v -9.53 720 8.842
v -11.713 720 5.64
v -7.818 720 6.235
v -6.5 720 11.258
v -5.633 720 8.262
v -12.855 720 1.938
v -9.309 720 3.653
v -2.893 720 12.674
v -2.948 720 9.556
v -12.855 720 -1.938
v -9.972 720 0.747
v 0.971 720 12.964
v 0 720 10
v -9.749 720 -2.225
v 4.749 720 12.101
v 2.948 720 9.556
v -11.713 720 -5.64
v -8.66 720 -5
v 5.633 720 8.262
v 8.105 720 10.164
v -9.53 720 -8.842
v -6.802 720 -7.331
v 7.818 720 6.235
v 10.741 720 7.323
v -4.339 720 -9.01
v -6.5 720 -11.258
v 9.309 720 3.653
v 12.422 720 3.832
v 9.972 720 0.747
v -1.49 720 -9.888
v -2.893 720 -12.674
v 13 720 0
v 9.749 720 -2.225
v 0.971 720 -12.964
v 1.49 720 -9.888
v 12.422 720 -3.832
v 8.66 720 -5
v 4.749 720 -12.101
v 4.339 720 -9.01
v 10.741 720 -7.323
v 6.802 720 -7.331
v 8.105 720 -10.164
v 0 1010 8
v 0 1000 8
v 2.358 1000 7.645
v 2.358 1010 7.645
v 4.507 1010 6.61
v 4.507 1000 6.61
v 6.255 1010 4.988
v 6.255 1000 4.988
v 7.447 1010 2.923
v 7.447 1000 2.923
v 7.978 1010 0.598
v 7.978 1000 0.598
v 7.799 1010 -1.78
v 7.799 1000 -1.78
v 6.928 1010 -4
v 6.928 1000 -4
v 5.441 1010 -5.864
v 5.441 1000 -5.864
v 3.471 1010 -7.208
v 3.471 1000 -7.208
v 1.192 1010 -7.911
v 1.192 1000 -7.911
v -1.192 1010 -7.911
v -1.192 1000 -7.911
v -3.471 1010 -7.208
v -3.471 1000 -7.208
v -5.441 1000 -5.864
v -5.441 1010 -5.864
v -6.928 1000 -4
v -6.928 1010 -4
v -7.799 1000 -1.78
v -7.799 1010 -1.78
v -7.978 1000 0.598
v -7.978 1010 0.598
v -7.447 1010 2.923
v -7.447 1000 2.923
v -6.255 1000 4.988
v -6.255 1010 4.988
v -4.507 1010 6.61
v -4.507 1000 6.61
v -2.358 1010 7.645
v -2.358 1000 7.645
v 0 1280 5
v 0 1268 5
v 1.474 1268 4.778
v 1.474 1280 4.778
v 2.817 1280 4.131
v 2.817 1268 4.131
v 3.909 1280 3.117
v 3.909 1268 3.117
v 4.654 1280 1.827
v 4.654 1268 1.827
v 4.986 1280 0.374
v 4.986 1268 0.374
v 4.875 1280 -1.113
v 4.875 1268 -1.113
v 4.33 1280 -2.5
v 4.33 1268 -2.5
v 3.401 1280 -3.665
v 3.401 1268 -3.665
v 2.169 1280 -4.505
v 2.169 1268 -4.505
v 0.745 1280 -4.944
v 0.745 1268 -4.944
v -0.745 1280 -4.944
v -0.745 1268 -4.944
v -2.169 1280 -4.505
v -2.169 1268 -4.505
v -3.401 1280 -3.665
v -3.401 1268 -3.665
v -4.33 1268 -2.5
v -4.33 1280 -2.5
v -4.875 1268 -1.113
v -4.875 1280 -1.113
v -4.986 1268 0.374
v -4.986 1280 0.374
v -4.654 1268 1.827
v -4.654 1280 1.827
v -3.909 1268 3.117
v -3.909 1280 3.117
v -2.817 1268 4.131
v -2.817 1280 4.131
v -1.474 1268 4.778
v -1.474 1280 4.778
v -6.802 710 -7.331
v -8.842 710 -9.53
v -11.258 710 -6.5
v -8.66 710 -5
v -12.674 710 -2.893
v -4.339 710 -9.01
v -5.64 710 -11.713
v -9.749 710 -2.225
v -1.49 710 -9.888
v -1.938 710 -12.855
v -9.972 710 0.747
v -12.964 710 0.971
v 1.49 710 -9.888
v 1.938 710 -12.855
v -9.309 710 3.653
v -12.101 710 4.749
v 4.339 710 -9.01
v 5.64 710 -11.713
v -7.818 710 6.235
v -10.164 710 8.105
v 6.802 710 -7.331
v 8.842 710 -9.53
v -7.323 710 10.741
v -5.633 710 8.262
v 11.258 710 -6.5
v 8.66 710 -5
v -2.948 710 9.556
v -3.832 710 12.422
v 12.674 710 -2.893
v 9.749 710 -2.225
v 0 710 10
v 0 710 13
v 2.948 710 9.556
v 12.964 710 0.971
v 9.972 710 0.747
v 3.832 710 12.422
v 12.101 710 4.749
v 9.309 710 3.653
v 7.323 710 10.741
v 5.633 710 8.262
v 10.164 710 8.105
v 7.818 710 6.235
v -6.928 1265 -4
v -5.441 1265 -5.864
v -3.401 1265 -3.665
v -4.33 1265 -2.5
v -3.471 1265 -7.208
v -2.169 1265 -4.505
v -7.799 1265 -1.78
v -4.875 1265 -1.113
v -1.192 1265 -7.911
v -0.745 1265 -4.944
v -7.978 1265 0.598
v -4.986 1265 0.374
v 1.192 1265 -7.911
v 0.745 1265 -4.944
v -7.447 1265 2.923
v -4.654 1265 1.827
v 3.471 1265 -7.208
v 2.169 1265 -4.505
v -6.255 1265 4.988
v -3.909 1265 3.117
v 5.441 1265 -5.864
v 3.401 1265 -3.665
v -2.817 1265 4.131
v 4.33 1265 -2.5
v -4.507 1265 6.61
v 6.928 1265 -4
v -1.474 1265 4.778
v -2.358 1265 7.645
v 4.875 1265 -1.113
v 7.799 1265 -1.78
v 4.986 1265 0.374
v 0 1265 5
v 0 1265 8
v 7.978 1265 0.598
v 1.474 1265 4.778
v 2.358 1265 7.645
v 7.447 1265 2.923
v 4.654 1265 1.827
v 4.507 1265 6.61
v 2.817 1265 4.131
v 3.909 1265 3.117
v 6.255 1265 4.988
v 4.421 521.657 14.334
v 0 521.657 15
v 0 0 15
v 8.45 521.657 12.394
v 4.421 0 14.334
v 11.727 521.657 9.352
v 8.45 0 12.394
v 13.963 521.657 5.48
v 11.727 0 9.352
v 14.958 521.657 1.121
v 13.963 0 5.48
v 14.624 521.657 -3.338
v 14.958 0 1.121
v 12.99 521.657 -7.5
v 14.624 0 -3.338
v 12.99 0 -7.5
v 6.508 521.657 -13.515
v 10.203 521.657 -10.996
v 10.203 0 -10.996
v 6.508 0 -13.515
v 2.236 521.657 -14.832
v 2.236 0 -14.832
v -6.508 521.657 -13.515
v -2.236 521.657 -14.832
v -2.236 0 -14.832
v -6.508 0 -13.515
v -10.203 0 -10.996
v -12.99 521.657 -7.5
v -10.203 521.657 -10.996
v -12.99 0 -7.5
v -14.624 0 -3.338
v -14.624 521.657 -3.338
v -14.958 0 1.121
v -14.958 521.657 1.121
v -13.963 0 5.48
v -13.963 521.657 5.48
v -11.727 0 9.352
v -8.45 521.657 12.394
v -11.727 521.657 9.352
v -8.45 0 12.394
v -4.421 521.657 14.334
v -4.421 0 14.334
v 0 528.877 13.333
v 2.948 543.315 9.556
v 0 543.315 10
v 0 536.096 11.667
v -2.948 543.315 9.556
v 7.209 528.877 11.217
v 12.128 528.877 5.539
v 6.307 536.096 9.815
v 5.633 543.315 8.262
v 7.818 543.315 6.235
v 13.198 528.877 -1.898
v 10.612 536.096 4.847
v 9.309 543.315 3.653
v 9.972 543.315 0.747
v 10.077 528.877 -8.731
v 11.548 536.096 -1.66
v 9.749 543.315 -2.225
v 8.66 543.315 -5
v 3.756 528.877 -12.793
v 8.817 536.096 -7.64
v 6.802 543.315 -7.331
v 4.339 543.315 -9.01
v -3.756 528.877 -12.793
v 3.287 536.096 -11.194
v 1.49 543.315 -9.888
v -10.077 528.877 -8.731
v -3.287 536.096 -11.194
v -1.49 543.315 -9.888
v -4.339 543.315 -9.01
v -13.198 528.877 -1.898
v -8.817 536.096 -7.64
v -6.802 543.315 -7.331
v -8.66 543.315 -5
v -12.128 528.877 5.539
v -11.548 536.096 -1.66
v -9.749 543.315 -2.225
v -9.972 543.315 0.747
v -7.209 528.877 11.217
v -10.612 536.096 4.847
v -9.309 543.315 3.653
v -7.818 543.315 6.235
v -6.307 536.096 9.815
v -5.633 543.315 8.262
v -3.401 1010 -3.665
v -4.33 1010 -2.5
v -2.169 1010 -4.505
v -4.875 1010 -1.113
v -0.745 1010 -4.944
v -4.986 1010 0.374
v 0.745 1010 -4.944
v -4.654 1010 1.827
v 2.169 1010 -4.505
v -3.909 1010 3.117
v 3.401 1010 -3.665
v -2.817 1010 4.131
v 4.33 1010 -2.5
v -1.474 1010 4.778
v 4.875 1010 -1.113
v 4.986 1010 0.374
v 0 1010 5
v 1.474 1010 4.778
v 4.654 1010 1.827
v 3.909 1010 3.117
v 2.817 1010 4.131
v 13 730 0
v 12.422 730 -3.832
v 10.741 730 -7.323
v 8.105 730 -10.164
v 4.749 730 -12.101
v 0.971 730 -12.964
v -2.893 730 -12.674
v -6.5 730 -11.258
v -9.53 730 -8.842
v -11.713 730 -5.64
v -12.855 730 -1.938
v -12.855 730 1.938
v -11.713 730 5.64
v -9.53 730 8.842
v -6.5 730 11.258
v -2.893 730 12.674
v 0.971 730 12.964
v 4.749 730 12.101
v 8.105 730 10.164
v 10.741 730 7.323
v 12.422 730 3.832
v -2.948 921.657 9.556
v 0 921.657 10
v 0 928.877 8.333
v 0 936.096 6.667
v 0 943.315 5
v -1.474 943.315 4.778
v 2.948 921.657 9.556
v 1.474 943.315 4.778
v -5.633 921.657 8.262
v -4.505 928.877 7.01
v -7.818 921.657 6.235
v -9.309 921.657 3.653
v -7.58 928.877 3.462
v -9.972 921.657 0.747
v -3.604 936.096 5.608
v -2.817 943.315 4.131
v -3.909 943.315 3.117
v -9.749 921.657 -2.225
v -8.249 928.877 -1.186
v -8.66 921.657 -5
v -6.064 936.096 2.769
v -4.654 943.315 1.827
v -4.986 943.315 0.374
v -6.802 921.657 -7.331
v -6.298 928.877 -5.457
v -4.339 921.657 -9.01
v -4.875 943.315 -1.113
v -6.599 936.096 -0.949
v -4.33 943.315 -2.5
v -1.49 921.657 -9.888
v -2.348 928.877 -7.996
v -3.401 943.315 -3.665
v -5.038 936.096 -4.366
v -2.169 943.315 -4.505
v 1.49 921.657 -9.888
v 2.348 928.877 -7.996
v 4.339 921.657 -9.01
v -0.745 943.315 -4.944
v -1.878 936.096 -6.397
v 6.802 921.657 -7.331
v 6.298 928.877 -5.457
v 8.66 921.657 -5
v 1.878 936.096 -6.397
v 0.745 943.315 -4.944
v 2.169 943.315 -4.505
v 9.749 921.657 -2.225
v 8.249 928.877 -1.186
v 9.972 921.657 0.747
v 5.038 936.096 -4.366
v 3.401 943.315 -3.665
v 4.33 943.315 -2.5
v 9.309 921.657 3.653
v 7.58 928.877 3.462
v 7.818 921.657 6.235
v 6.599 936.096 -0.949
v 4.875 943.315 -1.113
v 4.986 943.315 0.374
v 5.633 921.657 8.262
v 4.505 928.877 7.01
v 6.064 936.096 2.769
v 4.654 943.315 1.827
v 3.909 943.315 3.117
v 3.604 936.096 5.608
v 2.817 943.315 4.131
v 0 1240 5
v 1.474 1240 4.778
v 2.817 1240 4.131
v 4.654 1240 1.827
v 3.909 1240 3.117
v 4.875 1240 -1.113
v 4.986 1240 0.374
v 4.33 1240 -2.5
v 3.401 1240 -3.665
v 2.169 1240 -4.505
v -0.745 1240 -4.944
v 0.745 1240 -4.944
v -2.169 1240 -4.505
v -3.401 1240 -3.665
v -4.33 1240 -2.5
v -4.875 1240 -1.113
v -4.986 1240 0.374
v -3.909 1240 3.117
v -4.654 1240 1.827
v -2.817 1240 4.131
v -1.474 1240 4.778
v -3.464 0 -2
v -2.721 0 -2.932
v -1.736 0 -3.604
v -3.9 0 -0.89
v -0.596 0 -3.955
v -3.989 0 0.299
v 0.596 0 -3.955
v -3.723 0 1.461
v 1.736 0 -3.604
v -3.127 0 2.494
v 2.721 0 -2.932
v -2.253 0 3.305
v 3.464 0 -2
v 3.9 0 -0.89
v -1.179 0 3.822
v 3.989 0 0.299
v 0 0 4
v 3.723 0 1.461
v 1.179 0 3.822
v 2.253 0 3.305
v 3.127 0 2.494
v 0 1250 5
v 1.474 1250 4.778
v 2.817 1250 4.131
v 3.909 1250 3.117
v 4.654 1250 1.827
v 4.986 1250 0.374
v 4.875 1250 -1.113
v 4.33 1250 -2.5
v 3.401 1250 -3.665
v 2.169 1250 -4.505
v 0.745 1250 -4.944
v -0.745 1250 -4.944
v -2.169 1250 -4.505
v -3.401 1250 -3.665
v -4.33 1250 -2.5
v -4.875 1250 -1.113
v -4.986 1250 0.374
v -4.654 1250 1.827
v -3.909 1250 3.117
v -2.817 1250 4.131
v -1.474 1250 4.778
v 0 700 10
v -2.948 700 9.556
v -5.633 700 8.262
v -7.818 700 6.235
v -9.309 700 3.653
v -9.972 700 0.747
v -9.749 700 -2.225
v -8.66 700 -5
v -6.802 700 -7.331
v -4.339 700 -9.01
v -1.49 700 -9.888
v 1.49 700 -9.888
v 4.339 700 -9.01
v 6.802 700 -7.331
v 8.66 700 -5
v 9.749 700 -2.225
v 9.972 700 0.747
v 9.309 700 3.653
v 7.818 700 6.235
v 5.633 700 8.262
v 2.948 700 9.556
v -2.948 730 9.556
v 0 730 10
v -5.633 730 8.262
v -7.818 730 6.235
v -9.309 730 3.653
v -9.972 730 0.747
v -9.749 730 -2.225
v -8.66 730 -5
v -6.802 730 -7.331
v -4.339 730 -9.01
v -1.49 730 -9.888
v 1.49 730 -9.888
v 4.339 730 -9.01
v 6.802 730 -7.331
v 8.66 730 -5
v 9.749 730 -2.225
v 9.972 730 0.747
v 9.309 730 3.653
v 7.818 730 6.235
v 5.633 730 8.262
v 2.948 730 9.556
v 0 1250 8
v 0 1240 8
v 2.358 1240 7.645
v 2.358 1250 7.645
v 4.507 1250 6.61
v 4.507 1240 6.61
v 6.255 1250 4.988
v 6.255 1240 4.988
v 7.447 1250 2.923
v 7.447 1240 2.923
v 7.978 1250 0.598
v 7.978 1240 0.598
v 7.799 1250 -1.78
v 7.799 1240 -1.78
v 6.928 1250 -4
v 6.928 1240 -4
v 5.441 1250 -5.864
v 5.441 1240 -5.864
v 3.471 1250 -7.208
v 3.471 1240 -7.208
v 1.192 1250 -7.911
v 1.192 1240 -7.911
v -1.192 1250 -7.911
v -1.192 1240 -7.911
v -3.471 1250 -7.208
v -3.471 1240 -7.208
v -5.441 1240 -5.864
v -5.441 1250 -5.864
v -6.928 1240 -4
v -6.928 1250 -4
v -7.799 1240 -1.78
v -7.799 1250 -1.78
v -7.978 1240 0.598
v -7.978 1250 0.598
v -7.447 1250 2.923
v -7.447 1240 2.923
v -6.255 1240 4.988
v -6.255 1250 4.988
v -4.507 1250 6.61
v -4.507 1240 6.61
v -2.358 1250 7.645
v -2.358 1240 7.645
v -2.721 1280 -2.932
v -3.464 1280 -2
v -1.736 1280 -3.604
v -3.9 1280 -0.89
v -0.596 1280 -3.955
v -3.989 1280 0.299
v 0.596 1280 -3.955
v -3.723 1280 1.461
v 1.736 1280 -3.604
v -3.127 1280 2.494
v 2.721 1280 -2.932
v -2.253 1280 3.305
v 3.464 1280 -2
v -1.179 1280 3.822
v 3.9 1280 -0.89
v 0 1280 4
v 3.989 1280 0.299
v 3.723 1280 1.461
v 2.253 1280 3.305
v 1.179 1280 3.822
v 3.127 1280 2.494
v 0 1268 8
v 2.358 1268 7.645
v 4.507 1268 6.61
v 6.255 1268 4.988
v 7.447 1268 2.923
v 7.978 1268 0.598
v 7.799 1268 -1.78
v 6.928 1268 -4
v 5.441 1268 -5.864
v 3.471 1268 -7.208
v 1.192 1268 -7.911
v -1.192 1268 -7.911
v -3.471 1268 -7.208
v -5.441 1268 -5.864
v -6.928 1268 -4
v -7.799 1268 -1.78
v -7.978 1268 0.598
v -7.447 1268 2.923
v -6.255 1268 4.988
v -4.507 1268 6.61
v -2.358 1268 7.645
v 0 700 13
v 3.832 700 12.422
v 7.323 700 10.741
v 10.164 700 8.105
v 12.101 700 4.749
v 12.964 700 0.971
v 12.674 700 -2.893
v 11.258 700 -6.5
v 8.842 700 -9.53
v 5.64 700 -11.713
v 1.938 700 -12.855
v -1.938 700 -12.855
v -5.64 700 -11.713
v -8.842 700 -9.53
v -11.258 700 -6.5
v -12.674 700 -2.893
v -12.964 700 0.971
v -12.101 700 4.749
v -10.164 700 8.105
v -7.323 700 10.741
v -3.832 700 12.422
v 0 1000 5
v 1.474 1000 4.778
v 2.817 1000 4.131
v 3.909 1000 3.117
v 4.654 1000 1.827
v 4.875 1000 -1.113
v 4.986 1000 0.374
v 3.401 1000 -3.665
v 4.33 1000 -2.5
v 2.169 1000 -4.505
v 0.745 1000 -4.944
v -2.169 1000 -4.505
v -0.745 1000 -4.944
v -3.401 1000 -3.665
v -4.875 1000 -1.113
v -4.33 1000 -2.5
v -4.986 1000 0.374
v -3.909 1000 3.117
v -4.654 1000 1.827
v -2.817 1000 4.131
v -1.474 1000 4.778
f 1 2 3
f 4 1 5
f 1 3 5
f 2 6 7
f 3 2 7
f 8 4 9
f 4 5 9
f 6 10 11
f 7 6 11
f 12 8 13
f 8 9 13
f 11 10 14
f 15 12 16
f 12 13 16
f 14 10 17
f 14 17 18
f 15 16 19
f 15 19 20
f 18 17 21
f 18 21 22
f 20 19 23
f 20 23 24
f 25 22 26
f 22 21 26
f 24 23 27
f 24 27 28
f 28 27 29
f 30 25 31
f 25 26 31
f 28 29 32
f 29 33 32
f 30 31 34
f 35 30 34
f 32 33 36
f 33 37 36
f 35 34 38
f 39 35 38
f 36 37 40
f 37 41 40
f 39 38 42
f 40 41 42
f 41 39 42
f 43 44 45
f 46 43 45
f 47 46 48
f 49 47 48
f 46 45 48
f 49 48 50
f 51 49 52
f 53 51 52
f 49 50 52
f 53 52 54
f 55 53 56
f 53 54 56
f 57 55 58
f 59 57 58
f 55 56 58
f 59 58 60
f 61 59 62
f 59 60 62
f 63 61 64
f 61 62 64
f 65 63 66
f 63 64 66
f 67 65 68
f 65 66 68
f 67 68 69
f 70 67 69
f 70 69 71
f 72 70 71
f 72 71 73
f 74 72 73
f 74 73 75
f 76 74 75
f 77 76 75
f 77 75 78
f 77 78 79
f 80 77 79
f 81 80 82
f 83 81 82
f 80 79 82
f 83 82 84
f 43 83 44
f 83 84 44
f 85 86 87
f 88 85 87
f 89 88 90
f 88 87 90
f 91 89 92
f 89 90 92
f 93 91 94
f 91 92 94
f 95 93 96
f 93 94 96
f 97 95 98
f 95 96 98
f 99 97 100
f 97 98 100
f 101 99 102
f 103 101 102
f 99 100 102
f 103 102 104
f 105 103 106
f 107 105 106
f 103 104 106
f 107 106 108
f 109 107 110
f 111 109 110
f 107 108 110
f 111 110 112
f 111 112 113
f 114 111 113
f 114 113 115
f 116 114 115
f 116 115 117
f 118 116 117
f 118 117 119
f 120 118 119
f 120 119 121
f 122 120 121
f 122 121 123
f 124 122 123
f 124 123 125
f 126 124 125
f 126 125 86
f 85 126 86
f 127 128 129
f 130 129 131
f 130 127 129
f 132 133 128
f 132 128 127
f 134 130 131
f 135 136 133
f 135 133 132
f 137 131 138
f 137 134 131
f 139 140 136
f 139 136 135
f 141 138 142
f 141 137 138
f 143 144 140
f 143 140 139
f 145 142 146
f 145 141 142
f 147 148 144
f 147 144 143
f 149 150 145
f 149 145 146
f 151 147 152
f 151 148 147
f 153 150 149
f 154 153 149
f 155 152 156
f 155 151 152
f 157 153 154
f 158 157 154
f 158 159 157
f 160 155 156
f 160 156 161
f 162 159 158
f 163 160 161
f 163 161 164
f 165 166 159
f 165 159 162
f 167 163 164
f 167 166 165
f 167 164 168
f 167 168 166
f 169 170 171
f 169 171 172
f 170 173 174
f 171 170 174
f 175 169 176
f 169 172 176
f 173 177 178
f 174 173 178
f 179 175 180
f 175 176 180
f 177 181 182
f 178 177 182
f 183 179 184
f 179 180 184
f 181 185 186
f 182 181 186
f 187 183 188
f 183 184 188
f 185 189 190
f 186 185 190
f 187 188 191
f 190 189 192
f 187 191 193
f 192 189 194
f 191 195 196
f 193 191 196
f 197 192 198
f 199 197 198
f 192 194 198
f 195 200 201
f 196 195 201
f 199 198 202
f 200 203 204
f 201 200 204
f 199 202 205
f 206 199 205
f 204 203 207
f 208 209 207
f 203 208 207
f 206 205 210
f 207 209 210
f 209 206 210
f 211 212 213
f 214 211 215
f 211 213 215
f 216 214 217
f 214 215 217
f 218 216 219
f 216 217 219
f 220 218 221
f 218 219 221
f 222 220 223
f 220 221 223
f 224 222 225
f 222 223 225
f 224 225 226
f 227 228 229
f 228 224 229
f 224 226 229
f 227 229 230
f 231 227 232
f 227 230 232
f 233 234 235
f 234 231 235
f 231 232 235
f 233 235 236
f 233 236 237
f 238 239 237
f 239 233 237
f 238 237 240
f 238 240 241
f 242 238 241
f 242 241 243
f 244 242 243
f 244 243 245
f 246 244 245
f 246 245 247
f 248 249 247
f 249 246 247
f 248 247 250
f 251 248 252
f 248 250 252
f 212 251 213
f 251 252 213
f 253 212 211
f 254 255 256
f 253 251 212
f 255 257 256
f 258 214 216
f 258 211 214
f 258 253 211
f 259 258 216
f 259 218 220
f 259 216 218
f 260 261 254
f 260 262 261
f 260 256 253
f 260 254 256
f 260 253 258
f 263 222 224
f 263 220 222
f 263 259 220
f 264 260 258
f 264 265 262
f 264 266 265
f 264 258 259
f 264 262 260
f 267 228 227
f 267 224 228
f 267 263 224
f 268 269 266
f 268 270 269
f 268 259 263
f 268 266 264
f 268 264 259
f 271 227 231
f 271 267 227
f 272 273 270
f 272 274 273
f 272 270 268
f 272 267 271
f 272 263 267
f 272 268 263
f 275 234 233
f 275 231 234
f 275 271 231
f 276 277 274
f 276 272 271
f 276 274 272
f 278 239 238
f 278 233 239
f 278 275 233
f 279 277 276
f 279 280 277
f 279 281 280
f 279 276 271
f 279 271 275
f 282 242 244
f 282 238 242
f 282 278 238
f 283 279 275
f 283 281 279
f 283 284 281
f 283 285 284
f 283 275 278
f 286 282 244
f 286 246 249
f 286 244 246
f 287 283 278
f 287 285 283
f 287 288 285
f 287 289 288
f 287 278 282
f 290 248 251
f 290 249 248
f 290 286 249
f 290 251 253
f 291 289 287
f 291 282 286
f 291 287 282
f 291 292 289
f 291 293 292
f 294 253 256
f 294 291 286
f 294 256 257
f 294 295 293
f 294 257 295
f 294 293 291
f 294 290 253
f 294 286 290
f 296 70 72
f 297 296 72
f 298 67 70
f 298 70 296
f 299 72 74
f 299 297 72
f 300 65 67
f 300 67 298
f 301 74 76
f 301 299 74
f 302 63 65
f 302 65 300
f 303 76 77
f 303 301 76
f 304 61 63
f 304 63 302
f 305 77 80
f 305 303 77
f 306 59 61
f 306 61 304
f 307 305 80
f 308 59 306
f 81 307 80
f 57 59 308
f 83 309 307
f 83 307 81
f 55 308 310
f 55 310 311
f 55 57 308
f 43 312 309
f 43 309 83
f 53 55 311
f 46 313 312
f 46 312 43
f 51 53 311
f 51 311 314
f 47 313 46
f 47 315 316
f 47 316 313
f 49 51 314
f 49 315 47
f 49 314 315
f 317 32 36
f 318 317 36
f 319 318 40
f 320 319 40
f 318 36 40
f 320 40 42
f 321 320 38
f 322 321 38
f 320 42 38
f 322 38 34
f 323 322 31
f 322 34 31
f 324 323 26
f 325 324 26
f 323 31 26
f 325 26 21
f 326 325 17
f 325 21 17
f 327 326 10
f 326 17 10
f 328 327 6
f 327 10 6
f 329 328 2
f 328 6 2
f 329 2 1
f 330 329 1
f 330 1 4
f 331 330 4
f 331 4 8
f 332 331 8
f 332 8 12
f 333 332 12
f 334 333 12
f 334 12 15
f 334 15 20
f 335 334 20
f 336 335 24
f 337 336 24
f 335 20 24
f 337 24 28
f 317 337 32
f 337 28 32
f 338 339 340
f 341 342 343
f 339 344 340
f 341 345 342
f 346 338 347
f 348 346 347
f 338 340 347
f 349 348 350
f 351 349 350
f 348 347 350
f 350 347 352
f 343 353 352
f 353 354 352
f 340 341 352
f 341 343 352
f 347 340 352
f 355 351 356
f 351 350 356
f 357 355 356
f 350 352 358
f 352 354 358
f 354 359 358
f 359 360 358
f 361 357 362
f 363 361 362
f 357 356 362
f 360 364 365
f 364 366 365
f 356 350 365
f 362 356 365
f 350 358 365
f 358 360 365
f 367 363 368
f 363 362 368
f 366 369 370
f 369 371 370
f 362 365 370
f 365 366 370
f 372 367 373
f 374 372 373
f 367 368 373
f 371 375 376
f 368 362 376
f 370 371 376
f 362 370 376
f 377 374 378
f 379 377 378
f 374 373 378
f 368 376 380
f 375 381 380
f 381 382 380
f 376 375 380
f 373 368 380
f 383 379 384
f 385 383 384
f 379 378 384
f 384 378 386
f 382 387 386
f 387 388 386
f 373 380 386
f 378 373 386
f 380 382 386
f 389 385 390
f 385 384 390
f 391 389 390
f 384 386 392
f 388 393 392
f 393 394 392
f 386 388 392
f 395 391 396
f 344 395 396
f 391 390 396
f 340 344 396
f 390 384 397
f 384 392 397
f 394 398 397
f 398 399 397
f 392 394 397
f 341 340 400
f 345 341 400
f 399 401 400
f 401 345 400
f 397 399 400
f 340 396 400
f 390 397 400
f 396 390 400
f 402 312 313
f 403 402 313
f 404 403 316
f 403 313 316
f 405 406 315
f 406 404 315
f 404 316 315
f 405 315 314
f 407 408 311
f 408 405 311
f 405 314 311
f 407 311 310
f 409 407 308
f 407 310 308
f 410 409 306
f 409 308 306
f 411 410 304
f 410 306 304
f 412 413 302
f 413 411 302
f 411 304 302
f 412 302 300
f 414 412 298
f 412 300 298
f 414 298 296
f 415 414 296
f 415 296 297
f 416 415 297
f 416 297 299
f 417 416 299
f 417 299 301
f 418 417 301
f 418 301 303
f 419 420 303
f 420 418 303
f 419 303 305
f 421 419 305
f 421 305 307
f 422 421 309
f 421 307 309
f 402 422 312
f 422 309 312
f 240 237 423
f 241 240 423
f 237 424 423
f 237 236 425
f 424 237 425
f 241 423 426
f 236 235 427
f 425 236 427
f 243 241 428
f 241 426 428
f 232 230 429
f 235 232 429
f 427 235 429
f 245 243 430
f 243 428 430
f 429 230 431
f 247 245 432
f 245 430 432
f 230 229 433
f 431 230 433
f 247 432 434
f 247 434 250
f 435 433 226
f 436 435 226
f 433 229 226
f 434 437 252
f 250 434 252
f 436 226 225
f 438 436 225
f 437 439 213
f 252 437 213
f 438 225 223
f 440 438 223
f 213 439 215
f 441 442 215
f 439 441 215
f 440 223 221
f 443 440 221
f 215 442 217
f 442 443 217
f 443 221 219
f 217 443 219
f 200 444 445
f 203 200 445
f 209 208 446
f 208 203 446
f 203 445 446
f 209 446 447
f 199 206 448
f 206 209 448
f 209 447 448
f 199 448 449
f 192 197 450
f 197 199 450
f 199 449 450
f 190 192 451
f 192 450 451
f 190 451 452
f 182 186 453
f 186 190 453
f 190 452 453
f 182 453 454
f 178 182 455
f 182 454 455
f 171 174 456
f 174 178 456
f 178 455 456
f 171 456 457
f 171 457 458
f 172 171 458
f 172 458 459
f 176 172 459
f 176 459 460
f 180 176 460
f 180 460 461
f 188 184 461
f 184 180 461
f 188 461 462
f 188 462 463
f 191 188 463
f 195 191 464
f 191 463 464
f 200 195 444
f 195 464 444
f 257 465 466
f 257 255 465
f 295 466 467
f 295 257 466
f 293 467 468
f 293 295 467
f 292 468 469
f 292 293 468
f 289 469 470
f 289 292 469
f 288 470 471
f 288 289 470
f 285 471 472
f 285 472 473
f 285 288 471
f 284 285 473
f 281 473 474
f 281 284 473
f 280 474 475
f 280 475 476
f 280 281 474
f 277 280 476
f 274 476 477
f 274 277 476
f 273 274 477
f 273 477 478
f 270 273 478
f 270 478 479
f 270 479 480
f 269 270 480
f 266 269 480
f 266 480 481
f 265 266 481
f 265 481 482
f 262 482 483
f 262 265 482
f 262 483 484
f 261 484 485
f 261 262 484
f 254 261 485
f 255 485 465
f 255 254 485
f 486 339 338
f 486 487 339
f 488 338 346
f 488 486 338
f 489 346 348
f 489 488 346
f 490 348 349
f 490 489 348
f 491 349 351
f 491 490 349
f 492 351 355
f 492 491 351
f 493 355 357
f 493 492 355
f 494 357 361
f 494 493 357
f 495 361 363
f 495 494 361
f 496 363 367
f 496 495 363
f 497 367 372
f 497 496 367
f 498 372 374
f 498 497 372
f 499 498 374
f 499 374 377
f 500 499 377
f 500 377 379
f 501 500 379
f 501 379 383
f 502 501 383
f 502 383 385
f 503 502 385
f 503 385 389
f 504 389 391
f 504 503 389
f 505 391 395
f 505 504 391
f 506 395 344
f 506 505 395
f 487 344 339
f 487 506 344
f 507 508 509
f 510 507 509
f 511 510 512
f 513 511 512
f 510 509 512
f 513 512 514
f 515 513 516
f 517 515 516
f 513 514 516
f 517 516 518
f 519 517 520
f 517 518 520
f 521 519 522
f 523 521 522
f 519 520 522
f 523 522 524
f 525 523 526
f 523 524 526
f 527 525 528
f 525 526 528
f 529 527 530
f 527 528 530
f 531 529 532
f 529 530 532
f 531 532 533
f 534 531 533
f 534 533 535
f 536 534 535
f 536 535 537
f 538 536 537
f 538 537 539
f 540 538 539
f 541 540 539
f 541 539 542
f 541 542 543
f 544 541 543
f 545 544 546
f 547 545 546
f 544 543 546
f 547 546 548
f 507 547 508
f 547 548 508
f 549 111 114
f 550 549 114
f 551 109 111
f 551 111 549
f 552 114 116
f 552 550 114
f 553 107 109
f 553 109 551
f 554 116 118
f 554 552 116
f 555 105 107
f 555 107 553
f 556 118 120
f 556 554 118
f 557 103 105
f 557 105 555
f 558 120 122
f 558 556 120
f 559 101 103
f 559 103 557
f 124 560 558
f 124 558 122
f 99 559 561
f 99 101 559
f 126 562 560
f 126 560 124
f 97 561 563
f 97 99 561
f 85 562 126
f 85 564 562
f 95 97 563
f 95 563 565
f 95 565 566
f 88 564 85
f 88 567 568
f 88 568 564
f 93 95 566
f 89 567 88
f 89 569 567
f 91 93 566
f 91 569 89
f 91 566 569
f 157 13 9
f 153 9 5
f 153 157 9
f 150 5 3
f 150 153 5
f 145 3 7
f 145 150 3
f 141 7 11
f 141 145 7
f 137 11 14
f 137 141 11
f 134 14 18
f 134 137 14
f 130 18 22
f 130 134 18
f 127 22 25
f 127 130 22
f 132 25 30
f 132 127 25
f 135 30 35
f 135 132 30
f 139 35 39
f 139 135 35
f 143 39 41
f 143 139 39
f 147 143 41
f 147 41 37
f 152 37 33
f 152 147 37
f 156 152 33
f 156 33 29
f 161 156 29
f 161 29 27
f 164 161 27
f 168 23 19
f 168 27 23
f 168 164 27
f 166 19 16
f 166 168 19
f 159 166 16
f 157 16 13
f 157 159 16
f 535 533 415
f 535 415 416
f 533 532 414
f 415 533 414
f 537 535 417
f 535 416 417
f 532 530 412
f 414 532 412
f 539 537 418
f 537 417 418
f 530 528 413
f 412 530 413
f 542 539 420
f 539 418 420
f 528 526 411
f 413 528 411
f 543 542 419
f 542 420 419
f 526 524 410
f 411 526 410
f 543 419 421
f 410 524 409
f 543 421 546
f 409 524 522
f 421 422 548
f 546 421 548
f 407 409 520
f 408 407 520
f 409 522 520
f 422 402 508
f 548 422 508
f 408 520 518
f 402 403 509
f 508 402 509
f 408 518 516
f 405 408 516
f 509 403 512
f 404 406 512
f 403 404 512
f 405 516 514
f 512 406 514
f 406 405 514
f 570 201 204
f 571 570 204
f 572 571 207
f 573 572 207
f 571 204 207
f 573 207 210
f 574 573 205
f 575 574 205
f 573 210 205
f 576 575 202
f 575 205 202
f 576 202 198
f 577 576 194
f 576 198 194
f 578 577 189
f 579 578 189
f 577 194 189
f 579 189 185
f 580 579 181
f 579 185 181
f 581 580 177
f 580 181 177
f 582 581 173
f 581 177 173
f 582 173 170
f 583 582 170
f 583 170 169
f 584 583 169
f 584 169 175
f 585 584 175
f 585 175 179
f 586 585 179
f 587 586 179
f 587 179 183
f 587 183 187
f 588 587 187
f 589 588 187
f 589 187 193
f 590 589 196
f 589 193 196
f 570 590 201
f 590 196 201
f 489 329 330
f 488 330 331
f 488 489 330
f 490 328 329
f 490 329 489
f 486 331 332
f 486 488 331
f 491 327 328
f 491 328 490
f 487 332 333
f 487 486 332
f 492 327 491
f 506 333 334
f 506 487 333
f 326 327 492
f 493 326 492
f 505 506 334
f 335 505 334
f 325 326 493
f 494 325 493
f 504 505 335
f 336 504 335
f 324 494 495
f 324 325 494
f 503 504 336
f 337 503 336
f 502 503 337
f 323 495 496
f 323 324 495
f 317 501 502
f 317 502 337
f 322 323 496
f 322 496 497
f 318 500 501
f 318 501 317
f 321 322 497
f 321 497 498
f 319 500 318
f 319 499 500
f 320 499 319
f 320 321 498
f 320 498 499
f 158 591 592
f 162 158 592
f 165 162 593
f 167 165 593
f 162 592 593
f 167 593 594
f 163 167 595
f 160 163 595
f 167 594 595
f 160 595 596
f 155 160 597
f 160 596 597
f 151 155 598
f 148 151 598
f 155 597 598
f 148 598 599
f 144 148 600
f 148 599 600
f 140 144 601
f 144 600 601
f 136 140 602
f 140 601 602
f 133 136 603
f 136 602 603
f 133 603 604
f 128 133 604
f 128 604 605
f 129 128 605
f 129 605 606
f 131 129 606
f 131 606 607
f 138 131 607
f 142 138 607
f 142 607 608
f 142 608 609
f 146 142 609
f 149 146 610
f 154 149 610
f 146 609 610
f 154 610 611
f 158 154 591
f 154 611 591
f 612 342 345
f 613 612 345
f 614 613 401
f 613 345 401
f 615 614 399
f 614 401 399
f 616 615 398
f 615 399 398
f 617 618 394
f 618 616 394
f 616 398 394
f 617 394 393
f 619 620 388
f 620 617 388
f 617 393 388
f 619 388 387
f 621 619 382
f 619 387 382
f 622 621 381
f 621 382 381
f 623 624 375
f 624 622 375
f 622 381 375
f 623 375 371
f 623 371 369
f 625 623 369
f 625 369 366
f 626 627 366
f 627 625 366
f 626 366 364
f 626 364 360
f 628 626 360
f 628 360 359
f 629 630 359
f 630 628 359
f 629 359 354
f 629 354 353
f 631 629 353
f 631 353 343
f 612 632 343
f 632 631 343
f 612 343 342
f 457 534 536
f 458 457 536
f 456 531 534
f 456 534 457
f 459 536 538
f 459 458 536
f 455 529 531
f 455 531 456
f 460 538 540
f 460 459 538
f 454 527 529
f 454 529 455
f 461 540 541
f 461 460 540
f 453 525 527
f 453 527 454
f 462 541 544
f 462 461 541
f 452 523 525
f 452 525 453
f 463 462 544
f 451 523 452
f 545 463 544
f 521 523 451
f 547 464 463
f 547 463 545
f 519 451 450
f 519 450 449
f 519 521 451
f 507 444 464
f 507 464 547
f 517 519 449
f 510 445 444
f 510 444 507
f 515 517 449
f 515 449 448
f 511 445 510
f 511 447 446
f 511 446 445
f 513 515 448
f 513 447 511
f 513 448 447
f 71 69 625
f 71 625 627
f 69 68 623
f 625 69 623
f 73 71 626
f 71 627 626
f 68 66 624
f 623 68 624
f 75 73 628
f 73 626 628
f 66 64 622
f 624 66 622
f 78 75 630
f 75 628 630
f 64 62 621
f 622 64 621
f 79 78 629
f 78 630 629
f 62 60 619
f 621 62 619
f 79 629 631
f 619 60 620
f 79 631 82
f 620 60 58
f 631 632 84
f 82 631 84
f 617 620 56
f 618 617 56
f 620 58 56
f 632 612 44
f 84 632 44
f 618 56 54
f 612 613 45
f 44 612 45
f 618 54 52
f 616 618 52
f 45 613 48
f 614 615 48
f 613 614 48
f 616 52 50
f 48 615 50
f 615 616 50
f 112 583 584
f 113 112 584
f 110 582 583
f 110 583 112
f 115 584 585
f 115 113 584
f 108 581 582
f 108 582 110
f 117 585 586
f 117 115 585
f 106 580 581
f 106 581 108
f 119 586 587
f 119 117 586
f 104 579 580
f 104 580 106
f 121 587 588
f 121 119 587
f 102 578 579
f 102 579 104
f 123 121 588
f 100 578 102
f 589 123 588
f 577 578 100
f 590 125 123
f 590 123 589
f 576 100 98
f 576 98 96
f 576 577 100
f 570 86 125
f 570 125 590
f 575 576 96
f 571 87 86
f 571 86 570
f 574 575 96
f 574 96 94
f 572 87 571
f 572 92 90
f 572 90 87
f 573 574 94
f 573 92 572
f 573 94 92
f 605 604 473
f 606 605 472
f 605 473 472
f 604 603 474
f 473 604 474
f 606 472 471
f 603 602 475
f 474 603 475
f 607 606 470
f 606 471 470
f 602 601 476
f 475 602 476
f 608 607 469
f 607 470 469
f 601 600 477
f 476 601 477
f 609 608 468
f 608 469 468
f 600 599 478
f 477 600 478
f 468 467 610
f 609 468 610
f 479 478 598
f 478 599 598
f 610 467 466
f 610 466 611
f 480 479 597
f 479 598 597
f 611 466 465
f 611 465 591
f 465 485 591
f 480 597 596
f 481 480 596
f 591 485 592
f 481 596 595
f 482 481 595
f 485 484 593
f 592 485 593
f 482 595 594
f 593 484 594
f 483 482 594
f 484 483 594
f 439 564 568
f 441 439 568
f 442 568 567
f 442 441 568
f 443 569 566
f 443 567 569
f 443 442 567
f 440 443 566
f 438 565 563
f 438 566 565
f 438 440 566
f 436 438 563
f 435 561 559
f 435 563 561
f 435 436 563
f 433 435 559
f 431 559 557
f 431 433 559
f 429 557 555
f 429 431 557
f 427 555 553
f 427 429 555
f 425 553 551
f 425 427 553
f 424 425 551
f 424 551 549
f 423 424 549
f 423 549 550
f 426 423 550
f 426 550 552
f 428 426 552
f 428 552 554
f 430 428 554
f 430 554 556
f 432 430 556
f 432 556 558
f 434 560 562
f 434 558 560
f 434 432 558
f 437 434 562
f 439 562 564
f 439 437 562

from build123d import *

# Parameters (mm, degrees)
ESQUISSE1_R                  = 5
BOSS_EXTRU_1_DEPTH           = 1280
ESQUISSE2_R                  = 15
BOSS_EXTRU_2_DEPTH           = 500
ESQUISSE3_R                  = 10
BOSS_EXTRU_3_DEPTH           = 400
CHANFREIN1_SIZE              = 10
CHANFREIN1_SIZE_2            = 43.314758743
ENL_V_MAT_EXTRU_1_DEPTH      = 1281.175769182
ENL_V_MAT_EXTRU_1_DEPTH_BACK = 1281.175769182
ESQUISSE4_R                  = 4
ESQUISSE5_R                  = 13
ESQUISSE5_R_2                = 9.409989574
BOSS_EXTRU_4_DEPTH           = 10
ESQUISSE7_R                  = 8
ESQUISSE7_R_2                = 4.592937417
BOSS_EXTRU_5_DEPTH           = 10
ESQUISSE6_R                  = 8
ESQUISSE6_R_2                = 4.579122691
BOSS_EXTRU_6_DEPTH           = 10
BOSS_EXTRU_7_START           = 720
BOSS_EXTRU_7_OUTLINE_R       = 13
BOSS_EXTRU_7_OUTLINE_R_2     = 10
BOSS_EXTRU_7_DEPTH           = 10
ESQUISSE8_R                  = 8
ESQUISSE8_R_2                = 4.5
BOSS_EXTRU_8_DEPTH           = 3


# Read off the part's stored shape, not the designer's step: Boss.-Extru.7
with BuildPart() as part:
    # Esquisse1 → Boss.-Extru.1 (new body)
    with BuildSketch(Plane(origin=(0, 0, 0), x_dir=(1, 0, 0), z_dir=(0, 1, 0))):
        with Locations(Location((0, 0, 0), (0, 0, 270))):
            Circle(ESQUISSE1_R)
    extrude(amount=BOSS_EXTRU_1_DEPTH)

    # Esquisse2 → Boss.-Extru.2 (add)
    with BuildSketch(Plane(origin=(0, 0, 0), x_dir=(1, 0, 0), z_dir=(0, 1, 0))):
        with Locations(Location((0, 0, 0), (0, 0, 270))):
            Circle(ESQUISSE2_R)
    extrude(amount=BOSS_EXTRU_2_DEPTH)

    # Esquisse3 → Boss.-Extru.3 (add)
    with BuildSketch(Plane(origin=(0, 500, 0), x_dir=(1, 0, 0), z_dir=(0, 1, 0))):
        with Locations(Location((0, 0, 0), (0, 0, 270))):
            Circle(ESQUISSE3_R)
    extrude(amount=BOSS_EXTRU_3_DEPTH)

    # Chanfrein1
    # the kernel refuses this chamfer: 43.314758743, 10 mm, written as the material it adds along each edge
    with BuildSketch(Plane(origin=(0, 500, 0), x_dir=(0, 0, 1), z_dir=(-1, 0, 0))) as chanfrein1_piece_1_section:
        Polygon((10 + CHANFREIN1_SIZE, 0), (10, CHANFREIN1_SIZE_2), (10, 0), align=None)
    chanfrein1_piece_1 = revolve(axis=Axis((0, 500, 0), (0, 1, 0)), mode=Mode.PRIVATE)
    chanfrein1_piece_1 = chanfrein1_piece_1 & Plane(origin=(0, 533.274352099, 0), x_dir=(0, 0, 1), z_dir=(0, -1, 0)) * Cylinder(15, 174, mode=Mode.PRIVATE)
    add(chanfrein1_piece_1)
    with BuildSketch(Plane(origin=(0, 900, 0), x_dir=(0, 0, 1), z_dir=(1, 0, 0))) as chanfrein1_piece_2_section:
        Polygon((5 + CHANFREIN1_SIZE, 0), (5, -CHANFREIN1_SIZE_2), (5, 0), align=None)
    chanfrein1_piece_2 = revolve(axis=Axis((0, 900, 0), (0, -1, 0)), mode=Mode.PRIVATE)
    chanfrein1_piece_2 = chanfrein1_piece_2 & Plane(origin=(0, 933.283833366, 0), x_dir=(0, 0, 1), z_dir=(0, -1, 0)) * Cylinder(10, 174, mode=Mode.PRIVATE)
    add(chanfrein1_piece_2)

    # Esquisse4 → Enlèv. mat.-Extru.1 (cut, two sides: drawn at the far end of the back side and taken through both)
    with BuildSketch(Plane(origin=(0, 1280, 0), x_dir=(1, 0, 0), z_dir=(0, 1, 0)).offset(-ENL_V_MAT_EXTRU_1_DEPTH_BACK)):
        with Locations(Location((0, 0, 0), (0, 0, 270))):
            Circle(ESQUISSE4_R)
    extrude(amount=ENL_V_MAT_EXTRU_1_DEPTH + ENL_V_MAT_EXTRU_1_DEPTH_BACK, mode=Mode.SUBTRACT)

    # Esquisse5 → Boss.-Extru.4 (add)
    with BuildSketch(Plane(origin=(0, 700, 0), x_dir=(1, 0, 0), z_dir=(0, 1, 0))):
        with Locations(Location((0, 0, 0), (0, 0, 270))):
            Circle(ESQUISSE5_R)
        Circle(ESQUISSE5_R_2, mode=Mode.SUBTRACT)
    extrude(amount=BOSS_EXTRU_4_DEPTH)

    # Esquisse7 → Boss.-Extru.5 (add)
    with BuildSketch(Plane(origin=(0, 1240, 0), x_dir=(1, 0, 0), z_dir=(0, 1, 0))):
        with Locations(Location((0, 0, 0), (0, 0, 270))):
            Circle(ESQUISSE7_R)
        Circle(ESQUISSE7_R_2, mode=Mode.SUBTRACT)
    extrude(amount=BOSS_EXTRU_5_DEPTH)

    # Esquisse6 → Boss.-Extru.6 (add)
    with BuildSketch(Plane(origin=(0, 1000, 0), x_dir=(1, 0, 0), z_dir=(0, 1, 0))):
        with Locations(Location((0, 0, 0), (0, 0, 270))):
            Circle(ESQUISSE6_R)
        Circle(ESQUISSE6_R_2, mode=Mode.SUBTRACT)
    extrude(amount=BOSS_EXTRU_6_DEPTH)

    # Boss.-Extru.7 outline → Boss.-Extru.7 (add)
    with BuildSketch(Plane(origin=(0, 0, 0), x_dir=(1, 0, 0), z_dir=(0, 1, 0)).offset(BOSS_EXTRU_7_START)):
        Circle(BOSS_EXTRU_7_OUTLINE_R)
        Circle(BOSS_EXTRU_7_OUTLINE_R_2, mode=Mode.SUBTRACT)
    extrude(amount=BOSS_EXTRU_7_DEPTH)

    # Esquisse8 → Boss.-Extru.8 (add)
    with BuildSketch(Plane(origin=(0, 1265, 0), x_dir=(1, 0, 0), z_dir=(0, 1, 0))):
        with Locations(Location((0, 0, 0), (0, 0, 270))):
            Circle(ESQUISSE8_R)
        Circle(ESQUISSE8_R_2, mode=Mode.SUBTRACT)
    extrude(amount=BOSS_EXTRU_8_DEPTH)


solid = part.part
